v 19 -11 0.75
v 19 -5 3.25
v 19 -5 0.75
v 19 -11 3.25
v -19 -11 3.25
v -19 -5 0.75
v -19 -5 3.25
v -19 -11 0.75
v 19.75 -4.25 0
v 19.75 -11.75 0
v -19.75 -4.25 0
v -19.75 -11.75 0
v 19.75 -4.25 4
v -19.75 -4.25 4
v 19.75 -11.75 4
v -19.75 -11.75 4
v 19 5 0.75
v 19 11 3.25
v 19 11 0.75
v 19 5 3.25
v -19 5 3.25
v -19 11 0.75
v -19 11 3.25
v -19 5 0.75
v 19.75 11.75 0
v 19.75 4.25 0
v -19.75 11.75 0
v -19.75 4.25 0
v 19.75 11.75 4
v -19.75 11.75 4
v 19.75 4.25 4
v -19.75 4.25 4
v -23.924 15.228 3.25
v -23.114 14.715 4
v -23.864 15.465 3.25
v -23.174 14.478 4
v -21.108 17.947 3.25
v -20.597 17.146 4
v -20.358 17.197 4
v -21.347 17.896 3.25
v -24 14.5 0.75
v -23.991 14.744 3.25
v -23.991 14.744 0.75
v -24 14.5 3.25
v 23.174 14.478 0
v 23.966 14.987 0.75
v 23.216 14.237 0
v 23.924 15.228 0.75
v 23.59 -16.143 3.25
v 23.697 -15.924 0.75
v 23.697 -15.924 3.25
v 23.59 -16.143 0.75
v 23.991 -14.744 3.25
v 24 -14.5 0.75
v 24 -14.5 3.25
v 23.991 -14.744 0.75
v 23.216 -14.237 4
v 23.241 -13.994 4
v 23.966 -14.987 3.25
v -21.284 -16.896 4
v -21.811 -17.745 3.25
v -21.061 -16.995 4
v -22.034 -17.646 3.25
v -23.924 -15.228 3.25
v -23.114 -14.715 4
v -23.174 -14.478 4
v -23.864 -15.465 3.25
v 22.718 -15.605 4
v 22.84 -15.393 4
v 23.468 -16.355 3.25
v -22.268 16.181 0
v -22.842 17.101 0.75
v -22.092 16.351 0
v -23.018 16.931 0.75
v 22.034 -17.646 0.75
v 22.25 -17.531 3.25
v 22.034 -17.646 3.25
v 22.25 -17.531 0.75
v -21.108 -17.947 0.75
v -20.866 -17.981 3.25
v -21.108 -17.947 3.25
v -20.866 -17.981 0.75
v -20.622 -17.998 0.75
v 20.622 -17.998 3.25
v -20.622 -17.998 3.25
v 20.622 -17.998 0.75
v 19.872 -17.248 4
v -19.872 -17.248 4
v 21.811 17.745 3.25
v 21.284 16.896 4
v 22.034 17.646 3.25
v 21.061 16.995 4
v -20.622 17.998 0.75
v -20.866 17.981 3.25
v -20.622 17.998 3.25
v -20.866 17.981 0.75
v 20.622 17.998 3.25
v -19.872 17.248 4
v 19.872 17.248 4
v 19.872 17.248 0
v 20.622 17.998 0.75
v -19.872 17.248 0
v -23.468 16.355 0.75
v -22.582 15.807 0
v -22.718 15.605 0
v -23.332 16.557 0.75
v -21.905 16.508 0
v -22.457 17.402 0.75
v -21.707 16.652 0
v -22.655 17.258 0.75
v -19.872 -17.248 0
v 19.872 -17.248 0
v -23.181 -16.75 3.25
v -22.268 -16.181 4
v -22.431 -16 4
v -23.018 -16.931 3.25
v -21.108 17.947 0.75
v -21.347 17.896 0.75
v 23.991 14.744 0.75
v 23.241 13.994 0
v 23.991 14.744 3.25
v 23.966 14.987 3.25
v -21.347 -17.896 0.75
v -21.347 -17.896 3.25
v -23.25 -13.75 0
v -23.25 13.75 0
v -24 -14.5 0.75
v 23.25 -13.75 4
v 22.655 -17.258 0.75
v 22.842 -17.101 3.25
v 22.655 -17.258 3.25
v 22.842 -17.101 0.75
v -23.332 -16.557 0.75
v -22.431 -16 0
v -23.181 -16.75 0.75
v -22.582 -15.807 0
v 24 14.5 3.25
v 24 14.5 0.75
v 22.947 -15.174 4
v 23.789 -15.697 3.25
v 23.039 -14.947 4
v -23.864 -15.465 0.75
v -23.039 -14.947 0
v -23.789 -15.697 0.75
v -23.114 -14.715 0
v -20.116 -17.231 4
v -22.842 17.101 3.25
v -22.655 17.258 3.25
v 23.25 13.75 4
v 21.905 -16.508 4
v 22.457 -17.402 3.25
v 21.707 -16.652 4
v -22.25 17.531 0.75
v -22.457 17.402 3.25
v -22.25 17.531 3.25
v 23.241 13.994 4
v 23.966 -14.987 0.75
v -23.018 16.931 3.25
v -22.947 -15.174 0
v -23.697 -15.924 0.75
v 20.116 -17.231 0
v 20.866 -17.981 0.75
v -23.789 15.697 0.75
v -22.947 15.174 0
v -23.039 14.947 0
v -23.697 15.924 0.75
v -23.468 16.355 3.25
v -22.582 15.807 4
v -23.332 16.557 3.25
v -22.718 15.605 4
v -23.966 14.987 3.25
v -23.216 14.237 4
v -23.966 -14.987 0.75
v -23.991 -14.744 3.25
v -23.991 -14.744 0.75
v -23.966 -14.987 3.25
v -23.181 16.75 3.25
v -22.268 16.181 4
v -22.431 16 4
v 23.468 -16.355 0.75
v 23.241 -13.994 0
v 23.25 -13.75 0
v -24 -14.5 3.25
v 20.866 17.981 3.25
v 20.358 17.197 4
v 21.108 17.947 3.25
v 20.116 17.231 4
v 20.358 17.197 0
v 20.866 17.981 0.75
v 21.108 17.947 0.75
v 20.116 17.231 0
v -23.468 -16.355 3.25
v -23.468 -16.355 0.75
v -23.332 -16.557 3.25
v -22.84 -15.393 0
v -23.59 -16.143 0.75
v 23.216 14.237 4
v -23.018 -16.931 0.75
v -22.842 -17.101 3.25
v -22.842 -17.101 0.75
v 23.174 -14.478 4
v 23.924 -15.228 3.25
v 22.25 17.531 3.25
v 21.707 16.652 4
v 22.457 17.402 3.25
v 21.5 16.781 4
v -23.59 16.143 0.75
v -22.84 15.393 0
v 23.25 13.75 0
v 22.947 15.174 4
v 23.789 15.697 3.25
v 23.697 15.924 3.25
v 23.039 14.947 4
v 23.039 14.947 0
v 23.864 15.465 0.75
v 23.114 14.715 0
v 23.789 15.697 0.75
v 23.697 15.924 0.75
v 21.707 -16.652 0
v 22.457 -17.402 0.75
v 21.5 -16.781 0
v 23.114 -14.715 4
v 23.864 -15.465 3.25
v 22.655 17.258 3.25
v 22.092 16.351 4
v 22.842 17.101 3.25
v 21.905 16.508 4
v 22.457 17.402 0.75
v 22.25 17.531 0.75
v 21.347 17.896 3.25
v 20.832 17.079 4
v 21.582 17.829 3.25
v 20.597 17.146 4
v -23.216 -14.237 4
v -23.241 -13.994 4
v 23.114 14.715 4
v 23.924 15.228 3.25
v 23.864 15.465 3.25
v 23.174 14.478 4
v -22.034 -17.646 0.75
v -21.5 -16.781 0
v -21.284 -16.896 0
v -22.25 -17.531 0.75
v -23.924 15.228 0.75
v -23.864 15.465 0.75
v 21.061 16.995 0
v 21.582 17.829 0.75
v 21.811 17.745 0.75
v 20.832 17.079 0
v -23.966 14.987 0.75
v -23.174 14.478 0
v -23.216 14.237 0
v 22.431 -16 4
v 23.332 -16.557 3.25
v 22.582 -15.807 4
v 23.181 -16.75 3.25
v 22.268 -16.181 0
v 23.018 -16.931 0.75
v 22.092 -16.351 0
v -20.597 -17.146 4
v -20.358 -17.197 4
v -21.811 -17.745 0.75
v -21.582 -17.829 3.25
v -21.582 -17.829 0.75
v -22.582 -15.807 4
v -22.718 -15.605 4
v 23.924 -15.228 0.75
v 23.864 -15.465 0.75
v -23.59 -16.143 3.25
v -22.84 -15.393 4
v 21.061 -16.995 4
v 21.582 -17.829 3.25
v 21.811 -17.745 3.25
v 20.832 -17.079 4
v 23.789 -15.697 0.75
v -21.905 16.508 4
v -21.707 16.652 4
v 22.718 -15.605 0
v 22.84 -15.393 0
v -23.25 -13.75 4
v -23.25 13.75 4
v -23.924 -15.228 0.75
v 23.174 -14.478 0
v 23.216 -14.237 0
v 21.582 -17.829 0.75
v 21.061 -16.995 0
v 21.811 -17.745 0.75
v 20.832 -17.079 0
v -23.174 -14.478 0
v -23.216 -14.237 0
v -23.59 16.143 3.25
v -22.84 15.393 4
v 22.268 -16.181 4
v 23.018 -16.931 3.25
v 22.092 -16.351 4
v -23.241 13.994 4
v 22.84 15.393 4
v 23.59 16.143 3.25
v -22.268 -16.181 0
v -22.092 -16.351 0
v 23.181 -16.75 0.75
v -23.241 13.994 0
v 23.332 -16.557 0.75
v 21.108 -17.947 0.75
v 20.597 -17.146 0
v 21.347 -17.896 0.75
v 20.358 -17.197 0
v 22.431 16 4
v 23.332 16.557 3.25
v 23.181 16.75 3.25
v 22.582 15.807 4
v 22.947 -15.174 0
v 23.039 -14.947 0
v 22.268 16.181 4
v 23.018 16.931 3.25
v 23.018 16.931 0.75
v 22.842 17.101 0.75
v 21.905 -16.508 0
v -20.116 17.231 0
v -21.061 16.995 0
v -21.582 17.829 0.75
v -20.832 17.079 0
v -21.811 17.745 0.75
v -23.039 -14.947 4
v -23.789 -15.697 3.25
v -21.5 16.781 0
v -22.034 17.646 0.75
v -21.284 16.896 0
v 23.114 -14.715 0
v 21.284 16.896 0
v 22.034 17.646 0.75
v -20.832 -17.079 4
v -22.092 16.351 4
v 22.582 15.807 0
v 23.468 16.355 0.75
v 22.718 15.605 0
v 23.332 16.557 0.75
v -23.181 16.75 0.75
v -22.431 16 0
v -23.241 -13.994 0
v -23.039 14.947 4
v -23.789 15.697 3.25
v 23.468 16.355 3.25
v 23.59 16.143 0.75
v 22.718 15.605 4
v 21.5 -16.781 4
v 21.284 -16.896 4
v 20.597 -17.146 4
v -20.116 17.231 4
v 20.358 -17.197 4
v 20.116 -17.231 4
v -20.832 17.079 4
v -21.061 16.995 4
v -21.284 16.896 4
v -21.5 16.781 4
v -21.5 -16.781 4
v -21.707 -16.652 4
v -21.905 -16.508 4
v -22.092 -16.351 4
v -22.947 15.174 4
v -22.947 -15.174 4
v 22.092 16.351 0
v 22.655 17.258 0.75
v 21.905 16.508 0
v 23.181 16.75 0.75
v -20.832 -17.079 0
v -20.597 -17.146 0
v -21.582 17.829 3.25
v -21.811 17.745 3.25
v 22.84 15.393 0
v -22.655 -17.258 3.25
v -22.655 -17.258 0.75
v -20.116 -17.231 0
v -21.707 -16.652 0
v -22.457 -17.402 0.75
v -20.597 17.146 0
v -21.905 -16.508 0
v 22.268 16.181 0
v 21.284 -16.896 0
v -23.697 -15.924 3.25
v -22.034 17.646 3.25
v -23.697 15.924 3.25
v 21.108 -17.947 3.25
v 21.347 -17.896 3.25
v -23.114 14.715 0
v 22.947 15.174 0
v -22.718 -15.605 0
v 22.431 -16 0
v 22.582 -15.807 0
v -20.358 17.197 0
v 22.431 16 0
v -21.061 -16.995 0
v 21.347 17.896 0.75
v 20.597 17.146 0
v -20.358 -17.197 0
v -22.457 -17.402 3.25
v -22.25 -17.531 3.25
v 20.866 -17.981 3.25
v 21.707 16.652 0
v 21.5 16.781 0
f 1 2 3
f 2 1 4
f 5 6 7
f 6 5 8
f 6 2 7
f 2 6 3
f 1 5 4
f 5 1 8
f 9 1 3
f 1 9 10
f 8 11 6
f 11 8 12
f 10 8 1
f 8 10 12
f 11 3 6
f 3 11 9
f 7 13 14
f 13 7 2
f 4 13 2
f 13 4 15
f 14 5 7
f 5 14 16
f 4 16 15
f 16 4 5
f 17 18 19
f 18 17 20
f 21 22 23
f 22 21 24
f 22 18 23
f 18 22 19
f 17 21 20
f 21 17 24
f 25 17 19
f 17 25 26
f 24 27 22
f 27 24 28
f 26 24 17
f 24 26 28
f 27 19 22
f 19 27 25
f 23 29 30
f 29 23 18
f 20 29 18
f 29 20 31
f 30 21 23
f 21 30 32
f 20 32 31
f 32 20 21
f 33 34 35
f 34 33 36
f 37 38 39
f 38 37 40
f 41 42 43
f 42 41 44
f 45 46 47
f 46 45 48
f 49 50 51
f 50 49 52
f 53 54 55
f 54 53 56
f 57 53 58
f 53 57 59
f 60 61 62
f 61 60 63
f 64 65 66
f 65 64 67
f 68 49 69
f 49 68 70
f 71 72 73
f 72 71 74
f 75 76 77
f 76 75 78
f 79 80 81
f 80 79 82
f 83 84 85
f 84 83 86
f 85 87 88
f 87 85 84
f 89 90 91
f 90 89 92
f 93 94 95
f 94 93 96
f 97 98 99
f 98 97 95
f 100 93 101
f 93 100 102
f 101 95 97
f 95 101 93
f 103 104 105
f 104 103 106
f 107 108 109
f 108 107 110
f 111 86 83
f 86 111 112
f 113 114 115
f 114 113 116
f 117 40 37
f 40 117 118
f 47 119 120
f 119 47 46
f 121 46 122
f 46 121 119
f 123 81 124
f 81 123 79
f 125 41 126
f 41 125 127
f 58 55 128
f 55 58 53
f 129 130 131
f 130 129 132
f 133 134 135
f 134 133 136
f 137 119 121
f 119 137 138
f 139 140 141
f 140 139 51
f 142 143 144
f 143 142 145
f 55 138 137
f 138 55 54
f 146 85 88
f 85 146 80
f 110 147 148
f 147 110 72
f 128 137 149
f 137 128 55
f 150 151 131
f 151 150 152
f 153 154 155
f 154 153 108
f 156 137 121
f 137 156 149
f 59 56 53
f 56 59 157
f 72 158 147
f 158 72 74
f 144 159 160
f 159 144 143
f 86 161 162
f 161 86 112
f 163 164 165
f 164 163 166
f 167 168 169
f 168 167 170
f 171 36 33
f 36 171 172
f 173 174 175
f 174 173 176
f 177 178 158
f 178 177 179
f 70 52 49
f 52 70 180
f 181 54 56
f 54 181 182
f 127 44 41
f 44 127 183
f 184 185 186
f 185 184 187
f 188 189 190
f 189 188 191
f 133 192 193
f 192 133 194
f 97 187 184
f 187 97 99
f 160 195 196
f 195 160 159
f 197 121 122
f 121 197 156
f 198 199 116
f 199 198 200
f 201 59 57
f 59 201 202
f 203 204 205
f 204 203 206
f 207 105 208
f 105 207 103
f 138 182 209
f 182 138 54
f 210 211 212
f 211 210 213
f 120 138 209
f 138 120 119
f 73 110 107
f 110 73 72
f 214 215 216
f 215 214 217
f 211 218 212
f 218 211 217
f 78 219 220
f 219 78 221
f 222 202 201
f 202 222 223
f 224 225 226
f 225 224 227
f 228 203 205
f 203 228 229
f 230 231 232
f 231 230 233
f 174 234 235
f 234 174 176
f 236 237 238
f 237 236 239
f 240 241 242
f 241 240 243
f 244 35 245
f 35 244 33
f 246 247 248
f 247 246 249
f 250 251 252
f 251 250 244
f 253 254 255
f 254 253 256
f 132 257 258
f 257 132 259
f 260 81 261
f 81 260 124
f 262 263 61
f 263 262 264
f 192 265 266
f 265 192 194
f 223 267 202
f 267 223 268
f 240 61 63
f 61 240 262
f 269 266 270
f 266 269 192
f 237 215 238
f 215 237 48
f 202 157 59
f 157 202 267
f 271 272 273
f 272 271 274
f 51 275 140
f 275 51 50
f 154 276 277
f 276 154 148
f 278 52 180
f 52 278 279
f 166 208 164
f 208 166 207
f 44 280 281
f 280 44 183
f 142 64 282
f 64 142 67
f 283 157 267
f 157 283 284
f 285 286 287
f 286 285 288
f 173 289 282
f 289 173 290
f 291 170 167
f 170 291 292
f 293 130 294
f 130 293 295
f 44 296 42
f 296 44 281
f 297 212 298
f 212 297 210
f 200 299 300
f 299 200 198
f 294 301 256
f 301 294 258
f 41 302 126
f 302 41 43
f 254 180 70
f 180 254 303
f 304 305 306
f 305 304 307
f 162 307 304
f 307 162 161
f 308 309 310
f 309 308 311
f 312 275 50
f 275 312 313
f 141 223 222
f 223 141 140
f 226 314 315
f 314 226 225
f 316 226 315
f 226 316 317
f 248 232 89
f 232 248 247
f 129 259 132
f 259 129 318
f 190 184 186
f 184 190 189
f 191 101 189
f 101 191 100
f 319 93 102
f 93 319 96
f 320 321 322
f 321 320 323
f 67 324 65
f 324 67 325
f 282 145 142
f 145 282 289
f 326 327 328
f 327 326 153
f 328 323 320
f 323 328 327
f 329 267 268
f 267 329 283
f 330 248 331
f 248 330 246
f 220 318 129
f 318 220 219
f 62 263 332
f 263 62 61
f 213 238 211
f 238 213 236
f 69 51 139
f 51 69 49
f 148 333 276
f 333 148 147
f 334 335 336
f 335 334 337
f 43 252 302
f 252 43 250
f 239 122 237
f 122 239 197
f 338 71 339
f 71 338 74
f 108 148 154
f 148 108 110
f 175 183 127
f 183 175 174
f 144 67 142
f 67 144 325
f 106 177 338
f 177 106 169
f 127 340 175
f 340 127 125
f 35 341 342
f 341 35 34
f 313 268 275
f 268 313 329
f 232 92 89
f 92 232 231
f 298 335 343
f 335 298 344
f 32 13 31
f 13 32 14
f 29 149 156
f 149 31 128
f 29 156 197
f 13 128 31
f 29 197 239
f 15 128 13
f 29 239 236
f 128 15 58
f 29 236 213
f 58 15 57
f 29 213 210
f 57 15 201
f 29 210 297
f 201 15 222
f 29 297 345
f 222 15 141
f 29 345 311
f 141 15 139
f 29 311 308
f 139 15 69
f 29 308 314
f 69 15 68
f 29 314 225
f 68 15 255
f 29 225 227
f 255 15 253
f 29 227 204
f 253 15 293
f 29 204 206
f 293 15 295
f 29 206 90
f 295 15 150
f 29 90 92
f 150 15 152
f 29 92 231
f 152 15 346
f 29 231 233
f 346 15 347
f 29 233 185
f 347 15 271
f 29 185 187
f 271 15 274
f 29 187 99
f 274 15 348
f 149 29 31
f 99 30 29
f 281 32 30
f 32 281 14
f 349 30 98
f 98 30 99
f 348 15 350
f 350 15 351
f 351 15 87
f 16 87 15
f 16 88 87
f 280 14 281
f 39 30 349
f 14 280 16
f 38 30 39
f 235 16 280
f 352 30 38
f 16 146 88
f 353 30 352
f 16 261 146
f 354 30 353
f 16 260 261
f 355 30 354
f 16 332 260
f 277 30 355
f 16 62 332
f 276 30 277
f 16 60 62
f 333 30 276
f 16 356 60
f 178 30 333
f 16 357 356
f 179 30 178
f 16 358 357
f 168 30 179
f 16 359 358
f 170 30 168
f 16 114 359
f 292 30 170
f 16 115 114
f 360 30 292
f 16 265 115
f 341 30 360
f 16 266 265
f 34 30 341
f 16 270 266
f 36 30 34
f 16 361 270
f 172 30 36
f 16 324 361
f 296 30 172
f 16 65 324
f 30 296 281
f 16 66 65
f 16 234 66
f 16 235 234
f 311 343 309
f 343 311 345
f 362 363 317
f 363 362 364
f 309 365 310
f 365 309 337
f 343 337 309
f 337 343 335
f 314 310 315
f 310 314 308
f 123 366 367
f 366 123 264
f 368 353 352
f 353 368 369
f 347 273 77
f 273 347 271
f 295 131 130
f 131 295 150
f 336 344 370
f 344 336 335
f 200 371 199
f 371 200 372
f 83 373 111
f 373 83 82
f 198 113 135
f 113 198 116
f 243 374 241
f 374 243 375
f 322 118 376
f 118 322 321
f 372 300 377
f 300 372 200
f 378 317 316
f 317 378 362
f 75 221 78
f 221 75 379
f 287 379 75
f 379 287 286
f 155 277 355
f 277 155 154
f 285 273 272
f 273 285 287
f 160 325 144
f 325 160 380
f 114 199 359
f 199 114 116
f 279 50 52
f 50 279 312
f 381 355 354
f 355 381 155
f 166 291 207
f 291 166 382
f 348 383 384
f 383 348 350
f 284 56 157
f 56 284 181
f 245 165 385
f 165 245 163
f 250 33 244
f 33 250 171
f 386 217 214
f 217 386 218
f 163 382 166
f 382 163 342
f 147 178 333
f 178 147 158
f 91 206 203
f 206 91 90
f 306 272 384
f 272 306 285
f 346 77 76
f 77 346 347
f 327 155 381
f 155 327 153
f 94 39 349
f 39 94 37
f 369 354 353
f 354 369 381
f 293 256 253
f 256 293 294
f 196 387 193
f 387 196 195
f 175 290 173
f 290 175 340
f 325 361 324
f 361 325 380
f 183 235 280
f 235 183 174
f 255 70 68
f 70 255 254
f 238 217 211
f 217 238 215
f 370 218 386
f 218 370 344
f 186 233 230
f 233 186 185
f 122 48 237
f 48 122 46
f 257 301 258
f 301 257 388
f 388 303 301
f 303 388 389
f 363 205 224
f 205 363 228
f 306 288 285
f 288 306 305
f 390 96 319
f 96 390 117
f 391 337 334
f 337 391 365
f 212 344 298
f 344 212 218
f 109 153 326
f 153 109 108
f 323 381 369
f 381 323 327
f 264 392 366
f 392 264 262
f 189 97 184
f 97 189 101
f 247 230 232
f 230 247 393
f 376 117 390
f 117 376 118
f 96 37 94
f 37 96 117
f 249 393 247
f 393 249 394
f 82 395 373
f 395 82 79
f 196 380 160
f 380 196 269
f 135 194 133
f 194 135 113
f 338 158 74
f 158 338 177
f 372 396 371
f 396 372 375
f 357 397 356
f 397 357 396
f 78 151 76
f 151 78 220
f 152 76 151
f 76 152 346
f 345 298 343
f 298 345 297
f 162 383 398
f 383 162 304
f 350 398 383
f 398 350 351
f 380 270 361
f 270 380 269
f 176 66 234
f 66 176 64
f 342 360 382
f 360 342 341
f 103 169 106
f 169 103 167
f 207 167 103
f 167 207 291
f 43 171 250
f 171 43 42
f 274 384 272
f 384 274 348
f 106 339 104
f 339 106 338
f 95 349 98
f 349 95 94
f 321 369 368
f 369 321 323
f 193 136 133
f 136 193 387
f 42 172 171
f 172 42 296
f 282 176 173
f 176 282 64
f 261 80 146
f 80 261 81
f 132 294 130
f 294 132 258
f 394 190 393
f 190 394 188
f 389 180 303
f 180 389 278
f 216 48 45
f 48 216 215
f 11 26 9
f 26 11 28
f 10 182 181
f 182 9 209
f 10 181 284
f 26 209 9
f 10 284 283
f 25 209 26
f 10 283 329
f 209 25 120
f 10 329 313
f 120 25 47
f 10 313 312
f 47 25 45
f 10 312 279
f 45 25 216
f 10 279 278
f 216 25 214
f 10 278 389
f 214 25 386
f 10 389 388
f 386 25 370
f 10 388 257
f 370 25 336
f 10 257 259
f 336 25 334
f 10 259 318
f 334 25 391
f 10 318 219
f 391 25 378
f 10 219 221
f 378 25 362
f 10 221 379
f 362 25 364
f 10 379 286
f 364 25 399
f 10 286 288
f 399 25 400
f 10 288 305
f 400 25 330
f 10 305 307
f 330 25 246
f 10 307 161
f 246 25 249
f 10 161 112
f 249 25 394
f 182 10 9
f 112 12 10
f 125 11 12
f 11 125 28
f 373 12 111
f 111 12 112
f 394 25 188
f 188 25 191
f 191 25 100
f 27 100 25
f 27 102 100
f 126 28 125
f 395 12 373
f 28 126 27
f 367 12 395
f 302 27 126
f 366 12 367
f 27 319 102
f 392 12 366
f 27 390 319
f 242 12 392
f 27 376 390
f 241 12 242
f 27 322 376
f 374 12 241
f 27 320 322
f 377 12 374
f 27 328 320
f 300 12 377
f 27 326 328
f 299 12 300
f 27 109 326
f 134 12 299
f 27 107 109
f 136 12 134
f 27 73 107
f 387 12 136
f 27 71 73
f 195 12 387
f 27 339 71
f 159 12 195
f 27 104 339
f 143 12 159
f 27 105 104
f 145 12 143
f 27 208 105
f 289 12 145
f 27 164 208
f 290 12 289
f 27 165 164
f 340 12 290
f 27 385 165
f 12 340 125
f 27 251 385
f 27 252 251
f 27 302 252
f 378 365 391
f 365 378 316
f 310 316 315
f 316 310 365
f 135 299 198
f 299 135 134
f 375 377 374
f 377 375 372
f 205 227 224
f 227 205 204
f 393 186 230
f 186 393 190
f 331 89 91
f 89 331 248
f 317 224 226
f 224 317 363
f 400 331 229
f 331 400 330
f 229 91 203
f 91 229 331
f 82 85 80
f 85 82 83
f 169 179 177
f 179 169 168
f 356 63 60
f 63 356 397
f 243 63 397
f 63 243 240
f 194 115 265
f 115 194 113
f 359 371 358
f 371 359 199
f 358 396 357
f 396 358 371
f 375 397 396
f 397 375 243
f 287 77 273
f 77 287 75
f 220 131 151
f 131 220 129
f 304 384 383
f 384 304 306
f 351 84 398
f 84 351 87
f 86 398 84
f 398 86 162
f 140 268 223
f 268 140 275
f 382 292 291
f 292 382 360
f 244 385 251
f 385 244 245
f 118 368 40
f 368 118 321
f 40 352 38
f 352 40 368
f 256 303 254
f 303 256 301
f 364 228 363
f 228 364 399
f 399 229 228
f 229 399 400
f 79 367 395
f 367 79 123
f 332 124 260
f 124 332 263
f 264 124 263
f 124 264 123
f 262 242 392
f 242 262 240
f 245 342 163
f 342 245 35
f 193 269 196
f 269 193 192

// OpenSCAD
// License: Public Domain

//=== Flat Tri Glide ===//

//width of the webbing opening (1in = 25.4 mm)
_1_webbingOpeningWidth = 38;

// width of the gap for the webbing
_2_webbingGapWidth = 6;

// width of the side edges
_3_sideEdgeWidth = 5;

// width of the main edges
_4_mainEdgeWidth = 7;

// width of the center beam
_5_centerWidth = 10;

// overall thickness of the tri glide
_6_overallHeight = 4; //3

// percent corner rounding
_7_cornerRoundingPercent = 50; // [1:100]

// how much to break off the edges (in mm)
_8_cornerBreakage = 0.75;


module makeBody(xsize, ysize, height, radius) {
	translate([0,0,height/2]) {
		minkowski() {
			cube(size=[xsize-2*radius,ysize-2*radius, height/2], center = true);
			cylinder(r=radius, h=height/2, center=true);
		}
	}
}

module makeCuts(width, gap, thickness, height,b) {
	offset = (thickness+gap)/2;
	for (y = [-offset, offset]) {
		translate([0, y, 0]) {

			translate([0, 0, height/2])
				cube(size=[width, gap, height*2], center=true);
			translate([0, 0, 0])
				makeCutEnd(width, gap, thickness, height,b);
			translate([0, 0, height]) scale([1,1,-1])
				makeCutEnd(width, gap, thickness, height,b);
		}
	}
}

module makeCutEnd(width, gap, thickness, height,b)
{
	hull(){
		translate([0,0,+b/2])
			cube(size=[width, gap, b], center=true);
		translate([0,0,-b/2])
			cube(size=[width+2*b, gap+2*b, b], center=true);			
	}
}

module makeTriGlide(width, gap, edgeThicknessSide, edgeThicknessMain, centerThickness, height, rounding, b, $fn=90) {
	xsize = width + edgeThicknessSide * 2;
	ysize = centerThickness + edgeThicknessMain * 2 + gap * 2;
	radius = max(edgeThicknessSide,edgeThicknessMain)*(rounding/100);
	difference() {
        hull()
        {
		  makeBody(xsize-2*b, ysize-2*b, height, radius);
          translate([0,0,b])
		  makeBody(xsize, ysize, height-2*b, radius);
        }
		makeCuts(width, gap, centerThickness, height,b);
	}
}


makeTriGlide
  ( _1_webbingOpeningWidth
  , _2_webbingGapWidth
  , _3_sideEdgeWidth
  , _4_mainEdgeWidth
  , _5_centerWidth
  , _6_overallHeight
  , _7_cornerRoundingPercent
  ,_8_cornerBreakage
  );
